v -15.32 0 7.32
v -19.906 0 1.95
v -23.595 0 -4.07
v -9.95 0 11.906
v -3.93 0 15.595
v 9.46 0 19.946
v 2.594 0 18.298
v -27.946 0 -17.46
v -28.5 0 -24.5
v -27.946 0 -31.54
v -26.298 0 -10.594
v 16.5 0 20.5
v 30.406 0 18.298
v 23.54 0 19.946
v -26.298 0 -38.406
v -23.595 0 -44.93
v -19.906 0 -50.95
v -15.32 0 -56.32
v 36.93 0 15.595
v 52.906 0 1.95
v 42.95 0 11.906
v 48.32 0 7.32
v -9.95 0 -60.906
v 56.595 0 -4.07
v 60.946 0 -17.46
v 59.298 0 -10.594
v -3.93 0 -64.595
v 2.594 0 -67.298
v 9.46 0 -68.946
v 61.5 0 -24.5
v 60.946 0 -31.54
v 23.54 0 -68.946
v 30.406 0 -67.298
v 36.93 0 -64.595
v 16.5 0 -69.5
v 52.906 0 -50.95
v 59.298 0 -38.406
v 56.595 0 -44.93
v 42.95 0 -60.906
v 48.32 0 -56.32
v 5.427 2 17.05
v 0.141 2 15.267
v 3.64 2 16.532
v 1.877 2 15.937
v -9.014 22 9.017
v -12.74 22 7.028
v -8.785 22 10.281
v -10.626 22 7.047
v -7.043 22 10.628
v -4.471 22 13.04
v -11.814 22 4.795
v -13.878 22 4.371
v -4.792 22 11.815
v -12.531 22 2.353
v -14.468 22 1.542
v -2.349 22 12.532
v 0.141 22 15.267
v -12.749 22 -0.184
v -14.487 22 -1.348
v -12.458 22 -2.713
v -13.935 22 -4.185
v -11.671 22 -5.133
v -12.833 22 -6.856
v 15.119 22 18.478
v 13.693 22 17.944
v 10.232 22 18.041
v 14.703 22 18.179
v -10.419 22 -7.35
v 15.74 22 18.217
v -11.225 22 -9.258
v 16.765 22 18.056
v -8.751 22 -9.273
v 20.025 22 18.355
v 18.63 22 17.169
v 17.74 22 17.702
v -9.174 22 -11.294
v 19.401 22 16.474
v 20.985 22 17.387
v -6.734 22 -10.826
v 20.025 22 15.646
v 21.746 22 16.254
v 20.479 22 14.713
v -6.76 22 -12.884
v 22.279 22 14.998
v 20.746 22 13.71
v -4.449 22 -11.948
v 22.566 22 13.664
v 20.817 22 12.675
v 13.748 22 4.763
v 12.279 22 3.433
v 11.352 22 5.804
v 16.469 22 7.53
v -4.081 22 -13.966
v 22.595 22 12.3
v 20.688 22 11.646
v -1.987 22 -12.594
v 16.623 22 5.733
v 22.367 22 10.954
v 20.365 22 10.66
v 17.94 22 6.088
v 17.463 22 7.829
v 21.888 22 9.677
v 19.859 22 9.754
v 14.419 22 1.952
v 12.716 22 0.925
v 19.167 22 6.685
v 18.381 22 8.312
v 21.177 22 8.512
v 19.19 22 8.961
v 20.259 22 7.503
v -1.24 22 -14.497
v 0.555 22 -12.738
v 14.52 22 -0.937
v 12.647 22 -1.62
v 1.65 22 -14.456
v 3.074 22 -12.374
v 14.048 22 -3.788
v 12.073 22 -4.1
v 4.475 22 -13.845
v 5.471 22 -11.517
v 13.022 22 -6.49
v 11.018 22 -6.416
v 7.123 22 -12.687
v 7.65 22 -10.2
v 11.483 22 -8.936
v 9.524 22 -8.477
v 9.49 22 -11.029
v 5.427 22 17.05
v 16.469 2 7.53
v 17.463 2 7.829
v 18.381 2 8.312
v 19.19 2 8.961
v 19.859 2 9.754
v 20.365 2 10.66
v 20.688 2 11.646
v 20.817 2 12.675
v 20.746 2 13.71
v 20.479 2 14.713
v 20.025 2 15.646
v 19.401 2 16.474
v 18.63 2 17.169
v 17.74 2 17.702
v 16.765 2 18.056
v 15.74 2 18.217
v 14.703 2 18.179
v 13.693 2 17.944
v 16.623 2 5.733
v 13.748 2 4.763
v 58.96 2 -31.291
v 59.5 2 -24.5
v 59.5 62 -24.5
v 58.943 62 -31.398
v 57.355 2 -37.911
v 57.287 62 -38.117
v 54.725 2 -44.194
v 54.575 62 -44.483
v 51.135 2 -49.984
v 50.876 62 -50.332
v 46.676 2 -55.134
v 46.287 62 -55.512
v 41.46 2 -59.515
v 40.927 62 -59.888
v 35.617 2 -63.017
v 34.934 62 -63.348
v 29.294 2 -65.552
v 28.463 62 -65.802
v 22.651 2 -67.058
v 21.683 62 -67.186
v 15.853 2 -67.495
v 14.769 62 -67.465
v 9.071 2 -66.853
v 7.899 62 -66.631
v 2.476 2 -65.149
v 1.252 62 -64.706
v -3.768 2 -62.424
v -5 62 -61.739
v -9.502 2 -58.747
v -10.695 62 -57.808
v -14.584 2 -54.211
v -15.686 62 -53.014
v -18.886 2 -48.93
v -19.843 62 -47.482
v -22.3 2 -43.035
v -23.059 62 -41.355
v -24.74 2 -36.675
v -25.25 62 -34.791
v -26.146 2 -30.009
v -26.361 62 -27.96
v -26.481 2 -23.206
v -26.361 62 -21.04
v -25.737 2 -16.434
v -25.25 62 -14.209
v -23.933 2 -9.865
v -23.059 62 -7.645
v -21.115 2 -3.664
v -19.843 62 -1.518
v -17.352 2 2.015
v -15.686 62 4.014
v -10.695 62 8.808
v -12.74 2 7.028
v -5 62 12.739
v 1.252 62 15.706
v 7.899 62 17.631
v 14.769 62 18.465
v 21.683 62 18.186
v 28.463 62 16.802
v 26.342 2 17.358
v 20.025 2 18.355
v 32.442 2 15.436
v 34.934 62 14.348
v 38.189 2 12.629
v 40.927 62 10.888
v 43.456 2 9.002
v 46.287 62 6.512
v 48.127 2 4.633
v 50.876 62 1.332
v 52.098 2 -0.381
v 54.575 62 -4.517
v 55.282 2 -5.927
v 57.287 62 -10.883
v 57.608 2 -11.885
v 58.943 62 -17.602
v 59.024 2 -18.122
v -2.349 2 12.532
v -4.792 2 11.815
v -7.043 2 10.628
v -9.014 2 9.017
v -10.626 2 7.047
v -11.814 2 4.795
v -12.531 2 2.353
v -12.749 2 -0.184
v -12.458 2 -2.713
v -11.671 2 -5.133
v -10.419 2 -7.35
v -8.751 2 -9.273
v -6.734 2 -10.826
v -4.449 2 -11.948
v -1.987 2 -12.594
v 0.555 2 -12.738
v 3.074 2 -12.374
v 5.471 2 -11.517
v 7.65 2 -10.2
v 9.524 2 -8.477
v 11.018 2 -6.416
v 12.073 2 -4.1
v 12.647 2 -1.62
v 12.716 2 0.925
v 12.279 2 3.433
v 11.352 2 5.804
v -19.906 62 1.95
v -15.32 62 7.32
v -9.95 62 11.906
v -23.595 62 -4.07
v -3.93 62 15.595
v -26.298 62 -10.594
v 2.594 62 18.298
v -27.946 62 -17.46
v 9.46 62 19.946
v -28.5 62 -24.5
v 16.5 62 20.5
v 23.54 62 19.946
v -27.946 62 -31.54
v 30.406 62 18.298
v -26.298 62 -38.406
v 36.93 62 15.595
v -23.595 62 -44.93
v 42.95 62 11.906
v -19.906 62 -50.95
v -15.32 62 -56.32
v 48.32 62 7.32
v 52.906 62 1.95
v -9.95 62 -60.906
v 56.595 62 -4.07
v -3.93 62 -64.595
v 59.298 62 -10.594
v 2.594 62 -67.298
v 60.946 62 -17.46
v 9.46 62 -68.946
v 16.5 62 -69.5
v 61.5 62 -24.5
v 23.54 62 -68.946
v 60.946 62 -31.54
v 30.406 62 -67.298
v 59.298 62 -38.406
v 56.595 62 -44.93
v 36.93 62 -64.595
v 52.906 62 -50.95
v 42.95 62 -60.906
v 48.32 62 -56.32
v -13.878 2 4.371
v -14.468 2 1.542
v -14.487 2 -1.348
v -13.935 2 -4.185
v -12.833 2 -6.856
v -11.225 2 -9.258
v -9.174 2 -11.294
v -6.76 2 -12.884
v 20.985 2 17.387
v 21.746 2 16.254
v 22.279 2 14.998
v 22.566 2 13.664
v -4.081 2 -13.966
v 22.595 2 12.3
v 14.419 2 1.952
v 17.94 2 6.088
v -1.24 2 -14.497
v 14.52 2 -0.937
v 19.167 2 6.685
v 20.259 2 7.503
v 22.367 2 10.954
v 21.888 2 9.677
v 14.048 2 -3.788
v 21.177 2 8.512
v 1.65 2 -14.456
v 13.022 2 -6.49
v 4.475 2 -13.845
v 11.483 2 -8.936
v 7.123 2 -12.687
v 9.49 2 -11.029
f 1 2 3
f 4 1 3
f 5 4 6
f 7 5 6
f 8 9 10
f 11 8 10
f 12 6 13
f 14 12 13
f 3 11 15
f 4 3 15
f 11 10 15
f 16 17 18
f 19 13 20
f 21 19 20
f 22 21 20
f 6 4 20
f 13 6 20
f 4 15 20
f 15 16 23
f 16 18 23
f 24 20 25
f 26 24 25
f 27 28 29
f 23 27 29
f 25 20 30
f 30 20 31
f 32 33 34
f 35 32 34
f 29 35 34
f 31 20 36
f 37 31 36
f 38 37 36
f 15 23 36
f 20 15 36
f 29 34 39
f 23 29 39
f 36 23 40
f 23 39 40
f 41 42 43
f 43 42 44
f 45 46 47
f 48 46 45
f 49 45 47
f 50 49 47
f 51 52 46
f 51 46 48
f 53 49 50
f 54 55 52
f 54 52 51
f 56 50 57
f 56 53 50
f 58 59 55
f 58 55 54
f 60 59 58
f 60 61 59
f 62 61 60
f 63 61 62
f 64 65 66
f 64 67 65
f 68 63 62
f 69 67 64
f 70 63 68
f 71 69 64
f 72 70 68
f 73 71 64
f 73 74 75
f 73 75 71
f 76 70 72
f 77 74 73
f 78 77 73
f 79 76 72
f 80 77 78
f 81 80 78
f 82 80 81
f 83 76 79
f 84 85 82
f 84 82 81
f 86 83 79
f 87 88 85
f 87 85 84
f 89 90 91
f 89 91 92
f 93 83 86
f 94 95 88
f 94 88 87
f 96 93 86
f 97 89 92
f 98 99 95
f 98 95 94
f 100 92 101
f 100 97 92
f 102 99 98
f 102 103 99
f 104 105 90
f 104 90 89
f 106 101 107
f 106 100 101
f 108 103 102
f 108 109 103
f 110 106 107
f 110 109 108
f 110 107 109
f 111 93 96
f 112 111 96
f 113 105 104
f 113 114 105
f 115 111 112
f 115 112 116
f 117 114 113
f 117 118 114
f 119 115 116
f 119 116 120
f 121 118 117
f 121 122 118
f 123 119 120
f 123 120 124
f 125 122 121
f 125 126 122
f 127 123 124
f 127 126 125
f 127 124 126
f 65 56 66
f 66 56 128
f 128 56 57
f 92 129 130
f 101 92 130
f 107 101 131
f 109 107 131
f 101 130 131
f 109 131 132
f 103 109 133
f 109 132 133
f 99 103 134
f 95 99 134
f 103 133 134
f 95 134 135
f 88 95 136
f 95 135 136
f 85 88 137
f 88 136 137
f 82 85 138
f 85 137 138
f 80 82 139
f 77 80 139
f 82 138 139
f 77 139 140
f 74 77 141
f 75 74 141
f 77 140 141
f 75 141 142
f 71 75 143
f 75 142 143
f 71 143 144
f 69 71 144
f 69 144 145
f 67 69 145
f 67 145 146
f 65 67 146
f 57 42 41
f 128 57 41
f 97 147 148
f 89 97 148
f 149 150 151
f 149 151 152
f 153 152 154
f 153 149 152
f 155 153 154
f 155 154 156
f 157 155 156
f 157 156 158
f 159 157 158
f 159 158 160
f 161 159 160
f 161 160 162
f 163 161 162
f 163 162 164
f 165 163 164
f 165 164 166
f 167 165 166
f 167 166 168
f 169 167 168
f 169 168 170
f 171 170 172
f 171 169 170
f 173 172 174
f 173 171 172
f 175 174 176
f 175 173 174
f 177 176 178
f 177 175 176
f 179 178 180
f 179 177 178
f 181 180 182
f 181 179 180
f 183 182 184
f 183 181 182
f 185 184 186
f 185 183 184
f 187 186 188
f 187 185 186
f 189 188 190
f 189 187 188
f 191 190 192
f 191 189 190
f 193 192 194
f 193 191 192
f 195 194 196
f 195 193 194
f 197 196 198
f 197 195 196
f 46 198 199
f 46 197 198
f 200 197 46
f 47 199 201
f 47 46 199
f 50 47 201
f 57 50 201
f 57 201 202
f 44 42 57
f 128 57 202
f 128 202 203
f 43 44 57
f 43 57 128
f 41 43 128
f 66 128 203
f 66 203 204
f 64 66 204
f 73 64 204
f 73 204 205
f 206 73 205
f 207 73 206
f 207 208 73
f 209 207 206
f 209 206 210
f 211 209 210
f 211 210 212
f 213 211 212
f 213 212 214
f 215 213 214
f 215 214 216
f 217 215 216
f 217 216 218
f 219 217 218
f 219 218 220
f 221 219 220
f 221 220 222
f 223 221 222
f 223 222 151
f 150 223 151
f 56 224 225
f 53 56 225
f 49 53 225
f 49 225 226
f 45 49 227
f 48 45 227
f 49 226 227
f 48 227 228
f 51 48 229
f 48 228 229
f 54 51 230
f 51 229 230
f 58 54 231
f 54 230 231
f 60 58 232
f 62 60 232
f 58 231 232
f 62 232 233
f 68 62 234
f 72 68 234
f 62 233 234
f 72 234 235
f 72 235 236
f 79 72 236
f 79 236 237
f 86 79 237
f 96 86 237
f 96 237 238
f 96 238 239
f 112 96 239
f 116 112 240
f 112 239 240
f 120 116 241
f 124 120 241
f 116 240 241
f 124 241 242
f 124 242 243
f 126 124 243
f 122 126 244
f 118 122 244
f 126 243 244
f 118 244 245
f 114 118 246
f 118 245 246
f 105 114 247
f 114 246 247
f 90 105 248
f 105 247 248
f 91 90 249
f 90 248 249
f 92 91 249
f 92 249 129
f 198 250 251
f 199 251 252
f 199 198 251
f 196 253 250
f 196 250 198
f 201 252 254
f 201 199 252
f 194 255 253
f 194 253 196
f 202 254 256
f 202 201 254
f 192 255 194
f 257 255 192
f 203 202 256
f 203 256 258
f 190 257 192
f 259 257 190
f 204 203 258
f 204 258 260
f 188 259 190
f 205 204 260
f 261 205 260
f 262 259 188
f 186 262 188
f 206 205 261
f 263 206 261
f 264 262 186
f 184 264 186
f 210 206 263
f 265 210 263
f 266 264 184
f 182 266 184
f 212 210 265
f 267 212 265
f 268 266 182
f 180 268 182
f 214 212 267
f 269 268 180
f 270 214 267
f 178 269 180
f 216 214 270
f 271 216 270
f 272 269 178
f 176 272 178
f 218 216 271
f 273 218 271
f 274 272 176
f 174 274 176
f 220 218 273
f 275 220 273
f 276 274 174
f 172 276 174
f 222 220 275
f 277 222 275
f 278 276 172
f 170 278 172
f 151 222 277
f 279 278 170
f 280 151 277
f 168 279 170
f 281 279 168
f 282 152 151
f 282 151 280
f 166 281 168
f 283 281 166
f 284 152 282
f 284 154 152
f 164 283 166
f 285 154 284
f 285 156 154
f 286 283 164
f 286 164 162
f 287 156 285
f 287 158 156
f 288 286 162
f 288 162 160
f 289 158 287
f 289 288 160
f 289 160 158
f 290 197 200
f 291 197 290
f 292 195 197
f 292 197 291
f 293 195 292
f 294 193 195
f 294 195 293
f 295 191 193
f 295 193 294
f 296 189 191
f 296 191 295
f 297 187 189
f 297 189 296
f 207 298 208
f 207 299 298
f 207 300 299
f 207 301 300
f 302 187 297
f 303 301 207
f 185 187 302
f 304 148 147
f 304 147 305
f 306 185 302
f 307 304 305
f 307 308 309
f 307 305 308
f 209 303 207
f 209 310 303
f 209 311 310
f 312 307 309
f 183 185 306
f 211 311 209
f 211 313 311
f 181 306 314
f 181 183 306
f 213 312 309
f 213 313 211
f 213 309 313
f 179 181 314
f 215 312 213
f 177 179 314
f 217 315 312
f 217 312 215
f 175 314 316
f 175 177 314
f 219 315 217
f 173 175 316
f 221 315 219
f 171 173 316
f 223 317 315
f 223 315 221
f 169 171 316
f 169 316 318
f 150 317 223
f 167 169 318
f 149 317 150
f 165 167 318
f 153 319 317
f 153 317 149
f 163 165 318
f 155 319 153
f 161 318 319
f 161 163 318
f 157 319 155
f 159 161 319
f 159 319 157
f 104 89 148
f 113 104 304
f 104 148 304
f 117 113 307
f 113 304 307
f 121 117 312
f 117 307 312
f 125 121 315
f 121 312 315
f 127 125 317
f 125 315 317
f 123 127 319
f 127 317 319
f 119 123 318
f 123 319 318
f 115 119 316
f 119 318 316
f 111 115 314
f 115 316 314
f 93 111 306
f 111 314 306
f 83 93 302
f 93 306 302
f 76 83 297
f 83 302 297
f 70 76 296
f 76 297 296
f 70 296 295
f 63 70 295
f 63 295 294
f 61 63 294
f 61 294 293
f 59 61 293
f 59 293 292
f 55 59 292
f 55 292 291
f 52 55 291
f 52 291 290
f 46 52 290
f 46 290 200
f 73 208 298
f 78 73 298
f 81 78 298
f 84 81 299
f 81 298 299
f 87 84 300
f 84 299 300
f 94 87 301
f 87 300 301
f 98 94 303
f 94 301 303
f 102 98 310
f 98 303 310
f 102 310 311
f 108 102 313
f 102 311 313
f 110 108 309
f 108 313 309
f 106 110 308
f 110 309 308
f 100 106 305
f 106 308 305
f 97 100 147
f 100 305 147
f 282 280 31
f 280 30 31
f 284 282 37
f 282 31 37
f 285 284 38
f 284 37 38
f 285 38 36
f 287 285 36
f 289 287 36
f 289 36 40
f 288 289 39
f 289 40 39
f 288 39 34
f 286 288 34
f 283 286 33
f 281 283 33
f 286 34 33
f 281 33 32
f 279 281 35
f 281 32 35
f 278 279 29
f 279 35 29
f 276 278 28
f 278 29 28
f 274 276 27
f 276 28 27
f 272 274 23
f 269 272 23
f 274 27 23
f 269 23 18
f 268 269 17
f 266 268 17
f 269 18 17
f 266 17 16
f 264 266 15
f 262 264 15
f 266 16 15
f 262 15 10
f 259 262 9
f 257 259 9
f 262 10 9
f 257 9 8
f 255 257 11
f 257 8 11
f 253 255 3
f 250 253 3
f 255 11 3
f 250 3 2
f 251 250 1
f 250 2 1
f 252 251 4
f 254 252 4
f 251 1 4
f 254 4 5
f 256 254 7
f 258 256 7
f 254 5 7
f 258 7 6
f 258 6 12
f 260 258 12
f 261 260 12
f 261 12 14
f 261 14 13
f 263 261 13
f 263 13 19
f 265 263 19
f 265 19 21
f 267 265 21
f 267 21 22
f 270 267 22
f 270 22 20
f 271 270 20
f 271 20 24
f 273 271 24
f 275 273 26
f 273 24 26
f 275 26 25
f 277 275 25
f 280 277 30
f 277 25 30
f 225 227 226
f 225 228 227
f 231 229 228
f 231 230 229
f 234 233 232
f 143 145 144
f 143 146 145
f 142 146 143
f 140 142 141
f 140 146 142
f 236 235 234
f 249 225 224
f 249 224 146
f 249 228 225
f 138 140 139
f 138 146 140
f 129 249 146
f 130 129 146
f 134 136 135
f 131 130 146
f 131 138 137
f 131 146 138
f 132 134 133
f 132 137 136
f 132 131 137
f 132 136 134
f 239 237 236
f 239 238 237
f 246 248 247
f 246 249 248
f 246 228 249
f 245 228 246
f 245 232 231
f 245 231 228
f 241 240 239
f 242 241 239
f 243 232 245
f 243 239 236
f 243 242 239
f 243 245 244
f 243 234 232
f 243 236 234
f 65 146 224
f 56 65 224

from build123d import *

# Parameters (mm, degrees)
SKETCH1_R           = 45
BOSS_EXTRUDE1_DEPTH = 2
SKETCH2_R           = 45
SKETCH2_R_2         = 43
BOSS_EXTRUDE2_DEPTH = 60
BOSS_EXTRUDE3_DEPTH = 20


with BuildPart() as part:
    # Sketch1 → Boss-Extrude1 (new body)
    with BuildSketch(Plane(origin=(0, 0, 0), x_dir=(1, 0, 0), z_dir=(0, 1, 0))):
        with Locations((16.5, 24.5)):
            Circle(SKETCH1_R)
    extrude(amount=BOSS_EXTRUDE1_DEPTH)

    # Sketch2 → Boss-Extrude2 (add)
    with BuildSketch(Plane(origin=(0, 2, 0), x_dir=(1, 0, 0), z_dir=(0, 1, 0))):
        with Locations((16.5, 24.5)):
            Circle(SKETCH2_R)
        with Locations((16.5, 24.5)):
            Circle(SKETCH2_R_2, mode=Mode.SUBTRACT)
    extrude(amount=BOSS_EXTRUDE2_DEPTH)

    # Sketch4 → Boss-Extrude3 (add)
    with BuildSketch(Plane(origin=(0, 2, 0), x_dir=(1, 0, 0), z_dir=(0, 1, 0))):
        with BuildLine():
            Line((16.62283723, -5.732814302), (13.748295666, -4.763073196))
            ThreePointArc((13.748295666, -4.763073196), (-7.263767503, 12.607148038), (-2.774667592, -14.282987074))
            Line((-2.774667592, -14.282987074), (13.119042931, -19.644810544))
            ThreePointArc((13.119042931, -19.644810544), (22.396673207, -14.58419971), (16.62283723, -5.732814302))
        make_face()
        with BuildLine():
            Line((13.692970384, -17.943554089), (-2.348778298, -12.531789198))
            ThreePointArc((-2.348778298, -12.531789198), (-5.619876263, 11.444627158), (11.352459564, -5.803805808))
            Line((11.352459564, -5.803805808), (16.469142545, -7.529944639))
            ThreePointArc((16.469142545, -7.529944639), (20.636876468, -14.217879696), (13.692970384, -17.943554089))
        make_face(mode=Mode.SUBTRACT)
    extrude(amount=BOSS_EXTRUDE3_DEPTH)


solid = part.part
